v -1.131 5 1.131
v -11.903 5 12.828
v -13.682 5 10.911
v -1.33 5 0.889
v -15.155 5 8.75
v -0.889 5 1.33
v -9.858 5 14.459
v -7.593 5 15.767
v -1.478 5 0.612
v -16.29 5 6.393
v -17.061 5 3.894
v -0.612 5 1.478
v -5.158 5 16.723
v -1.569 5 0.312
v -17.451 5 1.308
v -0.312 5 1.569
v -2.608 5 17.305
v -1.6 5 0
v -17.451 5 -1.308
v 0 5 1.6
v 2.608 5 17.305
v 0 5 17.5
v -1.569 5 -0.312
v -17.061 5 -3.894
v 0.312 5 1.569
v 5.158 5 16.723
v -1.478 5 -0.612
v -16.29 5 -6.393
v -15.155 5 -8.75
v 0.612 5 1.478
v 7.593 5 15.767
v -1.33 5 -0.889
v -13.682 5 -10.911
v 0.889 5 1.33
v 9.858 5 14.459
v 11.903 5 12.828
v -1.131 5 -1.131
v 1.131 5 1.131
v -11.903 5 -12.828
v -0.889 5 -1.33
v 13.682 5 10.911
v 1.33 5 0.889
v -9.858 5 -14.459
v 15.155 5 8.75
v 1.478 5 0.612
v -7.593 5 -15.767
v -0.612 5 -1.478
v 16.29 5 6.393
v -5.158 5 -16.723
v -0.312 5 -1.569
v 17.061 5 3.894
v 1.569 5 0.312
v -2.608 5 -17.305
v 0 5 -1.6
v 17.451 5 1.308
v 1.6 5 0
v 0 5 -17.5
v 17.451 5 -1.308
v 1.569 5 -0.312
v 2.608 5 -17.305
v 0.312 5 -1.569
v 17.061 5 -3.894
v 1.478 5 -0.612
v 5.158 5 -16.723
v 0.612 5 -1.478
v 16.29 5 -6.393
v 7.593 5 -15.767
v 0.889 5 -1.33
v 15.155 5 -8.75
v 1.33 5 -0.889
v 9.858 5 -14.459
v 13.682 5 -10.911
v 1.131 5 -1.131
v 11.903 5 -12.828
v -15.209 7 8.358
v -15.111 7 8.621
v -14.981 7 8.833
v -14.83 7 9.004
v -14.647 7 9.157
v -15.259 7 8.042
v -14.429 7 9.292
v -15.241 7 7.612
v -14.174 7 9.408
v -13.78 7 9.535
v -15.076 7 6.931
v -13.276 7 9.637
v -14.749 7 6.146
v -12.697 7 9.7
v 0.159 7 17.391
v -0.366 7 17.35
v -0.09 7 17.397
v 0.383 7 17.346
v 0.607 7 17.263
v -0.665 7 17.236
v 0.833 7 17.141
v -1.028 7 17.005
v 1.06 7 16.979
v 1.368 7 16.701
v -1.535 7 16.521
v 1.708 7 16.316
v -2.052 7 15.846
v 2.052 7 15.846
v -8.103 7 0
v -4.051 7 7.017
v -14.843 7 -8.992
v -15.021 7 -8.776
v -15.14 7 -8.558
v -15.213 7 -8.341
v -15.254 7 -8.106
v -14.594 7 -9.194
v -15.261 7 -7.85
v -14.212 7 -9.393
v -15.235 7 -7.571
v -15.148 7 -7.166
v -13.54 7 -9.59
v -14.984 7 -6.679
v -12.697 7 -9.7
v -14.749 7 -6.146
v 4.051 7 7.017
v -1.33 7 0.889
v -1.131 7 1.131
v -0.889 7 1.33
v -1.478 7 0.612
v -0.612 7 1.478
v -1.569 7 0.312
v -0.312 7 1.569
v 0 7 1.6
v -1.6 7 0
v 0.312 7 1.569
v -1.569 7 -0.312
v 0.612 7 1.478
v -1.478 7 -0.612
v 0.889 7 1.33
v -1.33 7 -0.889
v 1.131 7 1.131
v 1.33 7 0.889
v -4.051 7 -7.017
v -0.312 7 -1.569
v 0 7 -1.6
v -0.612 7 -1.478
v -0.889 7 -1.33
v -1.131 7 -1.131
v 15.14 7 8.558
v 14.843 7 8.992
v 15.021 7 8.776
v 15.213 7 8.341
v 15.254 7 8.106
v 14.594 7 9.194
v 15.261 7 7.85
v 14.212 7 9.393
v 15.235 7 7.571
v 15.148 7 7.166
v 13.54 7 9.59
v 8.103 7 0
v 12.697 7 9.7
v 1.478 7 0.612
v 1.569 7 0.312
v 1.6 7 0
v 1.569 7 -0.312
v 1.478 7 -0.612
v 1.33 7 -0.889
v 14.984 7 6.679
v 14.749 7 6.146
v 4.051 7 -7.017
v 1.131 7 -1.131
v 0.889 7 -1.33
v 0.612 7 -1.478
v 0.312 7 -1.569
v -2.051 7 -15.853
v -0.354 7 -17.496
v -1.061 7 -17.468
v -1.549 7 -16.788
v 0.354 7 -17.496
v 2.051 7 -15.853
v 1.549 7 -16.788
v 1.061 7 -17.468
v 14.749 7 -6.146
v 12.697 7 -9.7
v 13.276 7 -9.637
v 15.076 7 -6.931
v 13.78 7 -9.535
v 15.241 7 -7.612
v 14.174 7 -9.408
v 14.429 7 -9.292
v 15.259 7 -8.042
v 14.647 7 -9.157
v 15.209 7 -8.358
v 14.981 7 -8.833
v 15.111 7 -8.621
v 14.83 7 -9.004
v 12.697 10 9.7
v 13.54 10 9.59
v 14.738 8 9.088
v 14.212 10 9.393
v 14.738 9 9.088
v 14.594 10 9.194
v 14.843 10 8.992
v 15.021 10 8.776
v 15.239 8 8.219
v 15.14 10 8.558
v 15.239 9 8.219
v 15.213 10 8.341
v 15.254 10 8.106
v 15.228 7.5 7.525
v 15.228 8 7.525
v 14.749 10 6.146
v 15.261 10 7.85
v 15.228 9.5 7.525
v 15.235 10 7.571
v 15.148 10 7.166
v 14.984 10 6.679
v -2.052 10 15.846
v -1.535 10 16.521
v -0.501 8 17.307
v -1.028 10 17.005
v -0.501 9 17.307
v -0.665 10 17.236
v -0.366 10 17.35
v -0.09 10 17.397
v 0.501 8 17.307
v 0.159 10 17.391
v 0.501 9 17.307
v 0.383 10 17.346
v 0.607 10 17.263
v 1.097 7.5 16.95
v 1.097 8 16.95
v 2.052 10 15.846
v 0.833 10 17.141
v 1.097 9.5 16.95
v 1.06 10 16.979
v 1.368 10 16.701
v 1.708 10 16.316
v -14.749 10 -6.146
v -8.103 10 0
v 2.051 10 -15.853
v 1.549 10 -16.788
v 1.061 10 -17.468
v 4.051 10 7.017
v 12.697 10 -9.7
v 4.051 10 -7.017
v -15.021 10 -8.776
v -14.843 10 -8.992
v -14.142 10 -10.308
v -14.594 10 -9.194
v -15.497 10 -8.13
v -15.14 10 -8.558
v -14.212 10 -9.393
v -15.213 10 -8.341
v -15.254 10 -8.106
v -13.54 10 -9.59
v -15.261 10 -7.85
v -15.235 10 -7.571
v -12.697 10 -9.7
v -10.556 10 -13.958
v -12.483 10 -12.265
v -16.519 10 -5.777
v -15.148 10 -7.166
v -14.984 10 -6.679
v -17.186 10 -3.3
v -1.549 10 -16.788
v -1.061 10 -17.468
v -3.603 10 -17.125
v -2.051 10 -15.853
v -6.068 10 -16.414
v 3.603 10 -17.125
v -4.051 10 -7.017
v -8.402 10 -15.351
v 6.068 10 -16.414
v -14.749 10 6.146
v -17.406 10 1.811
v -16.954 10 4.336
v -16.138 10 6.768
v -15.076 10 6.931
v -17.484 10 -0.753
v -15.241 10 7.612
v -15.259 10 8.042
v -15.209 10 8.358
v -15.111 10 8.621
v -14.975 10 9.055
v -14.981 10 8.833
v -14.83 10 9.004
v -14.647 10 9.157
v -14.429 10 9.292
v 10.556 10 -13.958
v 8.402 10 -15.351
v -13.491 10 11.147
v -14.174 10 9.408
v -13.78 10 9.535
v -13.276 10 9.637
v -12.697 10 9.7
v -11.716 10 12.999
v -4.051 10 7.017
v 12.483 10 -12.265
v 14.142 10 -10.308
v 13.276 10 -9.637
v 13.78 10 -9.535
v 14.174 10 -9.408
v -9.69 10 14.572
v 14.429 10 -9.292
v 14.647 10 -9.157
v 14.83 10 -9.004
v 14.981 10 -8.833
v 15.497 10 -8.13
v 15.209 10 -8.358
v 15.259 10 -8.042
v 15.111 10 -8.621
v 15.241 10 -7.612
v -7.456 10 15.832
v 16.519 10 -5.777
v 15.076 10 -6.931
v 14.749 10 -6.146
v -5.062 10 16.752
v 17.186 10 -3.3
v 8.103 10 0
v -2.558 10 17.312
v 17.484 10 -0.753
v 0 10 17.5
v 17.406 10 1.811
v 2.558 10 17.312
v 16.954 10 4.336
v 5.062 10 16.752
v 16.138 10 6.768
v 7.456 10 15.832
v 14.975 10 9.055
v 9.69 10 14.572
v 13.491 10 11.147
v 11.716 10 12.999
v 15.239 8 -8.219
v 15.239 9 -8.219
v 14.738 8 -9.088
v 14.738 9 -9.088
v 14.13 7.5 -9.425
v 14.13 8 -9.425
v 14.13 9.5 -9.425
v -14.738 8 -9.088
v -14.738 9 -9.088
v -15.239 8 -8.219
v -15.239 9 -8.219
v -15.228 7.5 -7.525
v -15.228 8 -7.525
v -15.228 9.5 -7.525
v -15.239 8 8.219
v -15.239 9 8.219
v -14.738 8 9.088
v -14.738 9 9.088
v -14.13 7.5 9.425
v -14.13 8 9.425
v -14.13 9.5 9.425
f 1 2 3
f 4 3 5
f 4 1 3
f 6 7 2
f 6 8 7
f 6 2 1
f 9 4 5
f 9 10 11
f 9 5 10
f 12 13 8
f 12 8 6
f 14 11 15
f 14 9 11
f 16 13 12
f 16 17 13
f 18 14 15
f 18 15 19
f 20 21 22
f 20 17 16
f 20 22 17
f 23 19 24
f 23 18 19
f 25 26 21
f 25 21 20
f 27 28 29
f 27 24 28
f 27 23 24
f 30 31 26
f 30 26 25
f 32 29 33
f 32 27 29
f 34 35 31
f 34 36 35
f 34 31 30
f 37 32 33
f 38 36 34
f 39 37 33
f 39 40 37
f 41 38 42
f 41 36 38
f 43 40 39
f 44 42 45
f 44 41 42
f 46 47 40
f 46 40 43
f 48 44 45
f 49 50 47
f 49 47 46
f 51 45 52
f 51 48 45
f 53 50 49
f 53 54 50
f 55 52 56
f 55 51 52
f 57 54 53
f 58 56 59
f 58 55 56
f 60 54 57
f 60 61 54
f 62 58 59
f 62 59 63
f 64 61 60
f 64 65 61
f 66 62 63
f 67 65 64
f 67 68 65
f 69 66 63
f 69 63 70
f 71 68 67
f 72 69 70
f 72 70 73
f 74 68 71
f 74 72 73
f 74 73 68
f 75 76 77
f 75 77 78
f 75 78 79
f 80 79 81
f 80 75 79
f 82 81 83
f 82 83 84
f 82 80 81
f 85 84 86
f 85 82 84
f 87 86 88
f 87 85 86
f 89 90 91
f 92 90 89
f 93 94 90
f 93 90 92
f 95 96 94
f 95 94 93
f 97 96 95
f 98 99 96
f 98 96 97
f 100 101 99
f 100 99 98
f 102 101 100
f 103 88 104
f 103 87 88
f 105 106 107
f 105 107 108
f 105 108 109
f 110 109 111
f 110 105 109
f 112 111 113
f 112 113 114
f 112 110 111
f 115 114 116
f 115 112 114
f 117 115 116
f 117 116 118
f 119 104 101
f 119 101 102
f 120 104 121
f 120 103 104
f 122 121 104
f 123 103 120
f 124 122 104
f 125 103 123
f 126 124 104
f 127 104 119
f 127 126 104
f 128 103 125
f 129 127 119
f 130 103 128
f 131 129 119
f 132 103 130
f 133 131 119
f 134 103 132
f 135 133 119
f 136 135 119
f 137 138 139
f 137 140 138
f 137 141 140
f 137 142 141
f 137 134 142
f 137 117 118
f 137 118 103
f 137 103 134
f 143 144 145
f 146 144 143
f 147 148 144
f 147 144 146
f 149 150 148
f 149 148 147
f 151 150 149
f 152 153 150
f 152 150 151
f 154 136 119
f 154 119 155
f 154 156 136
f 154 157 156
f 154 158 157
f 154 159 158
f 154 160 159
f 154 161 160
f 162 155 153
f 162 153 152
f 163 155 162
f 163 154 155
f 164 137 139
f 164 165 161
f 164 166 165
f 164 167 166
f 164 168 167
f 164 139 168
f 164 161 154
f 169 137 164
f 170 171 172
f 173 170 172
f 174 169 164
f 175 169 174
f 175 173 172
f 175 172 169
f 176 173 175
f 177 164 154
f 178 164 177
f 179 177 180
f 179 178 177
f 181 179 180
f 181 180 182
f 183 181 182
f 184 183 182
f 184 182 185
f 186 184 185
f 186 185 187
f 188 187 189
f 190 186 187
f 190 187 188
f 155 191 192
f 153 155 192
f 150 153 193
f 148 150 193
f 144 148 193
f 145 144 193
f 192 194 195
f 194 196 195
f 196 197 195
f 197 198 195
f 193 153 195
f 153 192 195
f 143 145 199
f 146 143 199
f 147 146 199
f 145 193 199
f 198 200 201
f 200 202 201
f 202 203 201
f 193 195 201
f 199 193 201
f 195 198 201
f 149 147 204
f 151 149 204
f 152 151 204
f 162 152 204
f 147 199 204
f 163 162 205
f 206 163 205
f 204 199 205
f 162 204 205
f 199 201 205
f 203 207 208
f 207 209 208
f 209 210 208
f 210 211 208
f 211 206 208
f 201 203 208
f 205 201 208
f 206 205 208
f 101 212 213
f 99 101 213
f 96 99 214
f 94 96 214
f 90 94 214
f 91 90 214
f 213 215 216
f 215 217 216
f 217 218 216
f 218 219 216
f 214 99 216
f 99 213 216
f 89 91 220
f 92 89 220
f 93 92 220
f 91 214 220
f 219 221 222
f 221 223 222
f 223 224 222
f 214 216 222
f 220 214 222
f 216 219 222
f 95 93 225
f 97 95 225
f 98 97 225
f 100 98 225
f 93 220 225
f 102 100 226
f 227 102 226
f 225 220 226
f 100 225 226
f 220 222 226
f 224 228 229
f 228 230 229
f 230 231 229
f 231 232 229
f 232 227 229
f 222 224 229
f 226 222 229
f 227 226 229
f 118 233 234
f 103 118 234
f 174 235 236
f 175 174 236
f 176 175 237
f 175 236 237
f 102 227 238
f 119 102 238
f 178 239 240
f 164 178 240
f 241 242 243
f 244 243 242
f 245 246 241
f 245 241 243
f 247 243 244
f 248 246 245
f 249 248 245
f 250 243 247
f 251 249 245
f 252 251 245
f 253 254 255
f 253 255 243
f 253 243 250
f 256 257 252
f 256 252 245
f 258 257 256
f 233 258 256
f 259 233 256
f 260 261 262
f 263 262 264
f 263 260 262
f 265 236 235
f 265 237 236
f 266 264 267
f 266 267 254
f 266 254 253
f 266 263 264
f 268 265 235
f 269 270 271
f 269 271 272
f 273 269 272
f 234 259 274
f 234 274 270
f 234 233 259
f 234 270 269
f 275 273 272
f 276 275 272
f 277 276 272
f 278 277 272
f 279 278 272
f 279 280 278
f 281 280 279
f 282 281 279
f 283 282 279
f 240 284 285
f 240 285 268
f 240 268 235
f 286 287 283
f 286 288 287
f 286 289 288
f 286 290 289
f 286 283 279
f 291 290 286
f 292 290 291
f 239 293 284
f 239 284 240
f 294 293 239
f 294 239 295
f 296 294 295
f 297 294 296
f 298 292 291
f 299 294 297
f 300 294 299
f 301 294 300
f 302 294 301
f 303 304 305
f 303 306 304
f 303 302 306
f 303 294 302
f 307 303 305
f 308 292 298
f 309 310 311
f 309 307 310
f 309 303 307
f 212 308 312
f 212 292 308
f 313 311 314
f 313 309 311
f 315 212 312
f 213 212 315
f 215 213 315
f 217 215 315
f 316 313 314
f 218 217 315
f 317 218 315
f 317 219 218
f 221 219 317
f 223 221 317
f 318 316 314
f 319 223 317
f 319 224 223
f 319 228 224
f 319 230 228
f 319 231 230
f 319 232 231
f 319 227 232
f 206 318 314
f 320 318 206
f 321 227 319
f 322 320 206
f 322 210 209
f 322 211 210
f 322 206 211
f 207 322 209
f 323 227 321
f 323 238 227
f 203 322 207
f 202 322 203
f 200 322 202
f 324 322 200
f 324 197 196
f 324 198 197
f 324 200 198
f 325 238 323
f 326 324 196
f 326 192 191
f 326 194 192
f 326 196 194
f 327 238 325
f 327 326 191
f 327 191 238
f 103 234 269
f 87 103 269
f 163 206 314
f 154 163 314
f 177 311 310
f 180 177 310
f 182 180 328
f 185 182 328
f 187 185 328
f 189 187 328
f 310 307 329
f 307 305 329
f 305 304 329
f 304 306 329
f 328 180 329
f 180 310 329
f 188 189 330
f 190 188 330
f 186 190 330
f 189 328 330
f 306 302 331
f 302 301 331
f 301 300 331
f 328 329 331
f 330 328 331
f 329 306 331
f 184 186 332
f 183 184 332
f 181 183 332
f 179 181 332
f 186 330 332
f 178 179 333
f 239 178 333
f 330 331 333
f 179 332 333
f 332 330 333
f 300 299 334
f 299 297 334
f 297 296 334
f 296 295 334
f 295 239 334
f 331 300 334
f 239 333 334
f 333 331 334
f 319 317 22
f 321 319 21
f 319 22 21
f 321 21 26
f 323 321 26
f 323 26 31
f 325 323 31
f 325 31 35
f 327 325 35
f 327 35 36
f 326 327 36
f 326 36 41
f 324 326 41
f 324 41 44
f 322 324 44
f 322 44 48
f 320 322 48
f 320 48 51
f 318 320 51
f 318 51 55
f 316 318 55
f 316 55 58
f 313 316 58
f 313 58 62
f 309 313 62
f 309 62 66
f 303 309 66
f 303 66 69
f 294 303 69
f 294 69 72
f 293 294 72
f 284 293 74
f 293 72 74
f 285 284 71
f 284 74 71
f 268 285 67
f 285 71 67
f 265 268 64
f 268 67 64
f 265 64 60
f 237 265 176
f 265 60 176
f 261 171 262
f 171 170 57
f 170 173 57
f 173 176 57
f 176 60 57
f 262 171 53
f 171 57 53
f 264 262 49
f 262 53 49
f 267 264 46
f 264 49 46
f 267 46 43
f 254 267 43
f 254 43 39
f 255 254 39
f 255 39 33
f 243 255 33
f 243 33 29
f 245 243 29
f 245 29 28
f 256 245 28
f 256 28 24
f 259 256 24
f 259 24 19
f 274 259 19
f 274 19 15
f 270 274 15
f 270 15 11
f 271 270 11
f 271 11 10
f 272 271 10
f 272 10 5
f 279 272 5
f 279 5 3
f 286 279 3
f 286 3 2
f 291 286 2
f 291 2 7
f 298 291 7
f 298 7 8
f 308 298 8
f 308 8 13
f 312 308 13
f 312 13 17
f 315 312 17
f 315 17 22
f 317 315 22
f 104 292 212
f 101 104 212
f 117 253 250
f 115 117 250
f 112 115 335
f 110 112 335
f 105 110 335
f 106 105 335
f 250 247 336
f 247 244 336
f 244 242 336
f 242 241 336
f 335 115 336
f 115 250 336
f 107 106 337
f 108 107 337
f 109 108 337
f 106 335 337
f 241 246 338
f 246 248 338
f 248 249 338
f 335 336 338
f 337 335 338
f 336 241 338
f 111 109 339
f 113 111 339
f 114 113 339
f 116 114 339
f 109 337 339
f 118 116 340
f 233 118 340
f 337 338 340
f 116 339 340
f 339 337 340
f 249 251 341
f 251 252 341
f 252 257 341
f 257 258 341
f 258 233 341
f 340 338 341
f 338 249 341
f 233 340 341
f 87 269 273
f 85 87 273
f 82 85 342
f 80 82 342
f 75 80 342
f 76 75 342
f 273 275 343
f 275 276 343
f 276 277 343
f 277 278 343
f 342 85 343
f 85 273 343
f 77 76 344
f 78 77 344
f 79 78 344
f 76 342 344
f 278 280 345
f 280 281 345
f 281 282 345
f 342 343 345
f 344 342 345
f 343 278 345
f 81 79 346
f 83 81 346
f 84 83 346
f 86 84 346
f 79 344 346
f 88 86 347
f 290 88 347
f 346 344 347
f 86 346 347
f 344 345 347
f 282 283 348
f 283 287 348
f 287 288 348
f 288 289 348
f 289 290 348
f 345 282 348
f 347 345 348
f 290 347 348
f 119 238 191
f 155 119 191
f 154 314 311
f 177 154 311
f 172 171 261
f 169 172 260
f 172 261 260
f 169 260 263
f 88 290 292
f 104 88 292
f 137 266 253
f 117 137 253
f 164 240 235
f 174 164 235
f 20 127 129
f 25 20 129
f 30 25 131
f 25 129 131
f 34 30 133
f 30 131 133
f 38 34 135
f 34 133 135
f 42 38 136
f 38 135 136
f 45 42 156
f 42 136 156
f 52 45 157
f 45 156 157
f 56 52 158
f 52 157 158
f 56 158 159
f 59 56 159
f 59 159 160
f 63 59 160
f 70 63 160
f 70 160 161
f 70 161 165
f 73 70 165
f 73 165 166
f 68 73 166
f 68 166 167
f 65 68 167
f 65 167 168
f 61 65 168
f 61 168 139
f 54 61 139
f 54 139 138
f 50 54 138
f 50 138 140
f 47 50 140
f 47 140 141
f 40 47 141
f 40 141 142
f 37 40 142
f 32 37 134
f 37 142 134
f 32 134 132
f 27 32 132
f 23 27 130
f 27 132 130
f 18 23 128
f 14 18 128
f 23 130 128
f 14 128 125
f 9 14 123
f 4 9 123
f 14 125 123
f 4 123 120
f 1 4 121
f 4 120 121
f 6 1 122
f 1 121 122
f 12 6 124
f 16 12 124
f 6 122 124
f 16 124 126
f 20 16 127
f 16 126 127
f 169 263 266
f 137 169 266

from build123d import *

# Parameters (mm, degrees)
SKETCH1_R           = 17.5
BOSS_EXTRUDE1_DEPTH = 10
CUT_EXTRUDE2_DEPTH  = 3
SKETCH4_R           = 17.5
CUT_EXTRUDE3_DEPTH  = 5
SKETCH5_R           = 1.6
CUT_EXTRUDE4_DEPTH  = 5


with BuildPart() as part:
    # Sketch1 → Boss-Extrude1 (new body)
    with BuildSketch(Plane(origin=(0, 0, 0), x_dir=(1, 0, 0), z_dir=(0, 1, 0))):
        with Locations(Location((0, 0, 0), (0, 0, 270))):
            Circle(SKETCH1_R)
    extrude(amount=BOSS_EXTRUDE1_DEPTH)

    # Sketch3 → Cut-Extrude2 (cut)
    with BuildSketch(Plane(origin=(-674.936170281, 10, -1288.963286539), x_dir=(1, 0, 0), z_dir=(0, 1, 0))):
        with BuildLine():
            Line((670.88481746, -1281.946137613), (662.239438243, -1279.26312032))
            add(Edge.make_bspline(
                [(662.239438243, -1279.26312032), (660.816630975, -1279.364358211), (659.786645841, -1280.216704525), (659.563484847, -1281.534870974), (660.187213896, -1282.817677158)],
                knots=[0.002399099, 0.002399099, 0.002399099, 0.375599775, 0.624400225, 0.997600901, 0.997600901, 0.997600901], degree=2))
            Line((660.187213896, -1282.817677158), (666.833464638, -1288.963286539))
            Line((666.833464638, -1288.963286539), (660.187213896, -1295.108895919))
            add(Edge.make_bspline(
                [(660.187213896, -1295.108895919), (659.563484847, -1296.391702103), (659.786645841, -1297.709868552), (660.816630975, -1298.562214867), (662.239438243, -1298.663452757)],
                knots=[0.002399099, 0.002399099, 0.002399099, 0.375599775, 0.624400225, 0.997600901, 0.997600901, 0.997600901], degree=2))
            Line((662.239438243, -1298.663452757), (670.88481746, -1295.980435464))
            Line((670.88481746, -1295.980435464), (672.883945934, -1304.809062138))
            add(Edge.make_bspline(
                [(672.883945934, -1304.809062138), (673.683024153, -1305.990630431), (674.936170281, -1306.456450565), (676.189316409, -1305.990630431), (676.988394628, -1304.809062138)],
                knots=[0.002399099, 0.002399099, 0.002399099, 0.375599775, 0.624400225, 0.997600901, 0.997600901, 0.997600901], degree=2))
            Line((676.988394628, -1304.809062138), (678.987523102, -1295.980435464))
            Line((678.987523102, -1295.980435464), (687.632902319, -1298.663452757))
            add(Edge.make_bspline(
                [(687.632902319, -1298.663452757), (689.055709587, -1298.562214867), (690.085694721, -1297.709868552), (690.308855715, -1296.391702103), (689.685126666, -1295.108895919)],
                knots=[0.002399099, 0.002399099, 0.002399099, 0.375599775, 0.624400225, 0.997600901, 0.997600901, 0.997600901], degree=2))
            Line((689.685126666, -1295.108895919), (683.038875923, -1288.963286539))
            Line((683.038875923, -1288.963286539), (689.685126666, -1282.817677158))
            add(Edge.make_bspline(
                [(689.685126666, -1282.817677158), (690.308855715, -1281.534870974), (690.08569472, -1280.216704525), (689.055709587, -1279.364358211), (687.632902319, -1279.26312032)],
                knots=[0.002399099, 0.002399099, 0.002399099, 0.375599775, 0.624400225, 0.997600901, 0.997600901, 0.997600901], degree=2))
            Line((687.632902319, -1279.26312032), (678.987523102, -1281.946137613))
            Line((678.987523102, -1281.946137613), (676.986708426, -1273.110064271))
            add(Edge.make_bspline(
                [(676.986708426, -1273.110064271), (676.173308063, -1271.410983092), (674.936170281, -1270.754606381), (673.699032499, -1271.410983092), (672.885632136, -1273.110064271)],
                knots=[0.001074269, 0.001074269, 0.001074269, 0.375268567, 0.624731433, 0.998925731, 0.998925731, 0.998925731], degree=2))
            Line((672.885632136, -1273.110064271), (670.88481746, -1281.946137613))
        make_face()
    extrude(amount=-CUT_EXTRUDE2_DEPTH, mode=Mode.SUBTRACT)

    # Sketch4 → Cut-Extrude3 (cut)
    with BuildSketch(Plane.XZ):
        with Locations(Location((0, 0, 0), (0, 0, 270))):
            Circle(SKETCH4_R)
    extrude(amount=-CUT_EXTRUDE3_DEPTH, mode=Mode.SUBTRACT)

    # Sketch5 → Cut-Extrude4 (cut)
    with BuildSketch(Plane(origin=(0, 7, 0), x_dir=(1, 0, 0), z_dir=(0, 1, 0))):
        with Locations(Location((0, 0, 0), (0, 0, 270))):
            Circle(SKETCH5_R)
    extrude(amount=-CUT_EXTRUDE4_DEPTH, mode=Mode.SUBTRACT)


solid = part.part
